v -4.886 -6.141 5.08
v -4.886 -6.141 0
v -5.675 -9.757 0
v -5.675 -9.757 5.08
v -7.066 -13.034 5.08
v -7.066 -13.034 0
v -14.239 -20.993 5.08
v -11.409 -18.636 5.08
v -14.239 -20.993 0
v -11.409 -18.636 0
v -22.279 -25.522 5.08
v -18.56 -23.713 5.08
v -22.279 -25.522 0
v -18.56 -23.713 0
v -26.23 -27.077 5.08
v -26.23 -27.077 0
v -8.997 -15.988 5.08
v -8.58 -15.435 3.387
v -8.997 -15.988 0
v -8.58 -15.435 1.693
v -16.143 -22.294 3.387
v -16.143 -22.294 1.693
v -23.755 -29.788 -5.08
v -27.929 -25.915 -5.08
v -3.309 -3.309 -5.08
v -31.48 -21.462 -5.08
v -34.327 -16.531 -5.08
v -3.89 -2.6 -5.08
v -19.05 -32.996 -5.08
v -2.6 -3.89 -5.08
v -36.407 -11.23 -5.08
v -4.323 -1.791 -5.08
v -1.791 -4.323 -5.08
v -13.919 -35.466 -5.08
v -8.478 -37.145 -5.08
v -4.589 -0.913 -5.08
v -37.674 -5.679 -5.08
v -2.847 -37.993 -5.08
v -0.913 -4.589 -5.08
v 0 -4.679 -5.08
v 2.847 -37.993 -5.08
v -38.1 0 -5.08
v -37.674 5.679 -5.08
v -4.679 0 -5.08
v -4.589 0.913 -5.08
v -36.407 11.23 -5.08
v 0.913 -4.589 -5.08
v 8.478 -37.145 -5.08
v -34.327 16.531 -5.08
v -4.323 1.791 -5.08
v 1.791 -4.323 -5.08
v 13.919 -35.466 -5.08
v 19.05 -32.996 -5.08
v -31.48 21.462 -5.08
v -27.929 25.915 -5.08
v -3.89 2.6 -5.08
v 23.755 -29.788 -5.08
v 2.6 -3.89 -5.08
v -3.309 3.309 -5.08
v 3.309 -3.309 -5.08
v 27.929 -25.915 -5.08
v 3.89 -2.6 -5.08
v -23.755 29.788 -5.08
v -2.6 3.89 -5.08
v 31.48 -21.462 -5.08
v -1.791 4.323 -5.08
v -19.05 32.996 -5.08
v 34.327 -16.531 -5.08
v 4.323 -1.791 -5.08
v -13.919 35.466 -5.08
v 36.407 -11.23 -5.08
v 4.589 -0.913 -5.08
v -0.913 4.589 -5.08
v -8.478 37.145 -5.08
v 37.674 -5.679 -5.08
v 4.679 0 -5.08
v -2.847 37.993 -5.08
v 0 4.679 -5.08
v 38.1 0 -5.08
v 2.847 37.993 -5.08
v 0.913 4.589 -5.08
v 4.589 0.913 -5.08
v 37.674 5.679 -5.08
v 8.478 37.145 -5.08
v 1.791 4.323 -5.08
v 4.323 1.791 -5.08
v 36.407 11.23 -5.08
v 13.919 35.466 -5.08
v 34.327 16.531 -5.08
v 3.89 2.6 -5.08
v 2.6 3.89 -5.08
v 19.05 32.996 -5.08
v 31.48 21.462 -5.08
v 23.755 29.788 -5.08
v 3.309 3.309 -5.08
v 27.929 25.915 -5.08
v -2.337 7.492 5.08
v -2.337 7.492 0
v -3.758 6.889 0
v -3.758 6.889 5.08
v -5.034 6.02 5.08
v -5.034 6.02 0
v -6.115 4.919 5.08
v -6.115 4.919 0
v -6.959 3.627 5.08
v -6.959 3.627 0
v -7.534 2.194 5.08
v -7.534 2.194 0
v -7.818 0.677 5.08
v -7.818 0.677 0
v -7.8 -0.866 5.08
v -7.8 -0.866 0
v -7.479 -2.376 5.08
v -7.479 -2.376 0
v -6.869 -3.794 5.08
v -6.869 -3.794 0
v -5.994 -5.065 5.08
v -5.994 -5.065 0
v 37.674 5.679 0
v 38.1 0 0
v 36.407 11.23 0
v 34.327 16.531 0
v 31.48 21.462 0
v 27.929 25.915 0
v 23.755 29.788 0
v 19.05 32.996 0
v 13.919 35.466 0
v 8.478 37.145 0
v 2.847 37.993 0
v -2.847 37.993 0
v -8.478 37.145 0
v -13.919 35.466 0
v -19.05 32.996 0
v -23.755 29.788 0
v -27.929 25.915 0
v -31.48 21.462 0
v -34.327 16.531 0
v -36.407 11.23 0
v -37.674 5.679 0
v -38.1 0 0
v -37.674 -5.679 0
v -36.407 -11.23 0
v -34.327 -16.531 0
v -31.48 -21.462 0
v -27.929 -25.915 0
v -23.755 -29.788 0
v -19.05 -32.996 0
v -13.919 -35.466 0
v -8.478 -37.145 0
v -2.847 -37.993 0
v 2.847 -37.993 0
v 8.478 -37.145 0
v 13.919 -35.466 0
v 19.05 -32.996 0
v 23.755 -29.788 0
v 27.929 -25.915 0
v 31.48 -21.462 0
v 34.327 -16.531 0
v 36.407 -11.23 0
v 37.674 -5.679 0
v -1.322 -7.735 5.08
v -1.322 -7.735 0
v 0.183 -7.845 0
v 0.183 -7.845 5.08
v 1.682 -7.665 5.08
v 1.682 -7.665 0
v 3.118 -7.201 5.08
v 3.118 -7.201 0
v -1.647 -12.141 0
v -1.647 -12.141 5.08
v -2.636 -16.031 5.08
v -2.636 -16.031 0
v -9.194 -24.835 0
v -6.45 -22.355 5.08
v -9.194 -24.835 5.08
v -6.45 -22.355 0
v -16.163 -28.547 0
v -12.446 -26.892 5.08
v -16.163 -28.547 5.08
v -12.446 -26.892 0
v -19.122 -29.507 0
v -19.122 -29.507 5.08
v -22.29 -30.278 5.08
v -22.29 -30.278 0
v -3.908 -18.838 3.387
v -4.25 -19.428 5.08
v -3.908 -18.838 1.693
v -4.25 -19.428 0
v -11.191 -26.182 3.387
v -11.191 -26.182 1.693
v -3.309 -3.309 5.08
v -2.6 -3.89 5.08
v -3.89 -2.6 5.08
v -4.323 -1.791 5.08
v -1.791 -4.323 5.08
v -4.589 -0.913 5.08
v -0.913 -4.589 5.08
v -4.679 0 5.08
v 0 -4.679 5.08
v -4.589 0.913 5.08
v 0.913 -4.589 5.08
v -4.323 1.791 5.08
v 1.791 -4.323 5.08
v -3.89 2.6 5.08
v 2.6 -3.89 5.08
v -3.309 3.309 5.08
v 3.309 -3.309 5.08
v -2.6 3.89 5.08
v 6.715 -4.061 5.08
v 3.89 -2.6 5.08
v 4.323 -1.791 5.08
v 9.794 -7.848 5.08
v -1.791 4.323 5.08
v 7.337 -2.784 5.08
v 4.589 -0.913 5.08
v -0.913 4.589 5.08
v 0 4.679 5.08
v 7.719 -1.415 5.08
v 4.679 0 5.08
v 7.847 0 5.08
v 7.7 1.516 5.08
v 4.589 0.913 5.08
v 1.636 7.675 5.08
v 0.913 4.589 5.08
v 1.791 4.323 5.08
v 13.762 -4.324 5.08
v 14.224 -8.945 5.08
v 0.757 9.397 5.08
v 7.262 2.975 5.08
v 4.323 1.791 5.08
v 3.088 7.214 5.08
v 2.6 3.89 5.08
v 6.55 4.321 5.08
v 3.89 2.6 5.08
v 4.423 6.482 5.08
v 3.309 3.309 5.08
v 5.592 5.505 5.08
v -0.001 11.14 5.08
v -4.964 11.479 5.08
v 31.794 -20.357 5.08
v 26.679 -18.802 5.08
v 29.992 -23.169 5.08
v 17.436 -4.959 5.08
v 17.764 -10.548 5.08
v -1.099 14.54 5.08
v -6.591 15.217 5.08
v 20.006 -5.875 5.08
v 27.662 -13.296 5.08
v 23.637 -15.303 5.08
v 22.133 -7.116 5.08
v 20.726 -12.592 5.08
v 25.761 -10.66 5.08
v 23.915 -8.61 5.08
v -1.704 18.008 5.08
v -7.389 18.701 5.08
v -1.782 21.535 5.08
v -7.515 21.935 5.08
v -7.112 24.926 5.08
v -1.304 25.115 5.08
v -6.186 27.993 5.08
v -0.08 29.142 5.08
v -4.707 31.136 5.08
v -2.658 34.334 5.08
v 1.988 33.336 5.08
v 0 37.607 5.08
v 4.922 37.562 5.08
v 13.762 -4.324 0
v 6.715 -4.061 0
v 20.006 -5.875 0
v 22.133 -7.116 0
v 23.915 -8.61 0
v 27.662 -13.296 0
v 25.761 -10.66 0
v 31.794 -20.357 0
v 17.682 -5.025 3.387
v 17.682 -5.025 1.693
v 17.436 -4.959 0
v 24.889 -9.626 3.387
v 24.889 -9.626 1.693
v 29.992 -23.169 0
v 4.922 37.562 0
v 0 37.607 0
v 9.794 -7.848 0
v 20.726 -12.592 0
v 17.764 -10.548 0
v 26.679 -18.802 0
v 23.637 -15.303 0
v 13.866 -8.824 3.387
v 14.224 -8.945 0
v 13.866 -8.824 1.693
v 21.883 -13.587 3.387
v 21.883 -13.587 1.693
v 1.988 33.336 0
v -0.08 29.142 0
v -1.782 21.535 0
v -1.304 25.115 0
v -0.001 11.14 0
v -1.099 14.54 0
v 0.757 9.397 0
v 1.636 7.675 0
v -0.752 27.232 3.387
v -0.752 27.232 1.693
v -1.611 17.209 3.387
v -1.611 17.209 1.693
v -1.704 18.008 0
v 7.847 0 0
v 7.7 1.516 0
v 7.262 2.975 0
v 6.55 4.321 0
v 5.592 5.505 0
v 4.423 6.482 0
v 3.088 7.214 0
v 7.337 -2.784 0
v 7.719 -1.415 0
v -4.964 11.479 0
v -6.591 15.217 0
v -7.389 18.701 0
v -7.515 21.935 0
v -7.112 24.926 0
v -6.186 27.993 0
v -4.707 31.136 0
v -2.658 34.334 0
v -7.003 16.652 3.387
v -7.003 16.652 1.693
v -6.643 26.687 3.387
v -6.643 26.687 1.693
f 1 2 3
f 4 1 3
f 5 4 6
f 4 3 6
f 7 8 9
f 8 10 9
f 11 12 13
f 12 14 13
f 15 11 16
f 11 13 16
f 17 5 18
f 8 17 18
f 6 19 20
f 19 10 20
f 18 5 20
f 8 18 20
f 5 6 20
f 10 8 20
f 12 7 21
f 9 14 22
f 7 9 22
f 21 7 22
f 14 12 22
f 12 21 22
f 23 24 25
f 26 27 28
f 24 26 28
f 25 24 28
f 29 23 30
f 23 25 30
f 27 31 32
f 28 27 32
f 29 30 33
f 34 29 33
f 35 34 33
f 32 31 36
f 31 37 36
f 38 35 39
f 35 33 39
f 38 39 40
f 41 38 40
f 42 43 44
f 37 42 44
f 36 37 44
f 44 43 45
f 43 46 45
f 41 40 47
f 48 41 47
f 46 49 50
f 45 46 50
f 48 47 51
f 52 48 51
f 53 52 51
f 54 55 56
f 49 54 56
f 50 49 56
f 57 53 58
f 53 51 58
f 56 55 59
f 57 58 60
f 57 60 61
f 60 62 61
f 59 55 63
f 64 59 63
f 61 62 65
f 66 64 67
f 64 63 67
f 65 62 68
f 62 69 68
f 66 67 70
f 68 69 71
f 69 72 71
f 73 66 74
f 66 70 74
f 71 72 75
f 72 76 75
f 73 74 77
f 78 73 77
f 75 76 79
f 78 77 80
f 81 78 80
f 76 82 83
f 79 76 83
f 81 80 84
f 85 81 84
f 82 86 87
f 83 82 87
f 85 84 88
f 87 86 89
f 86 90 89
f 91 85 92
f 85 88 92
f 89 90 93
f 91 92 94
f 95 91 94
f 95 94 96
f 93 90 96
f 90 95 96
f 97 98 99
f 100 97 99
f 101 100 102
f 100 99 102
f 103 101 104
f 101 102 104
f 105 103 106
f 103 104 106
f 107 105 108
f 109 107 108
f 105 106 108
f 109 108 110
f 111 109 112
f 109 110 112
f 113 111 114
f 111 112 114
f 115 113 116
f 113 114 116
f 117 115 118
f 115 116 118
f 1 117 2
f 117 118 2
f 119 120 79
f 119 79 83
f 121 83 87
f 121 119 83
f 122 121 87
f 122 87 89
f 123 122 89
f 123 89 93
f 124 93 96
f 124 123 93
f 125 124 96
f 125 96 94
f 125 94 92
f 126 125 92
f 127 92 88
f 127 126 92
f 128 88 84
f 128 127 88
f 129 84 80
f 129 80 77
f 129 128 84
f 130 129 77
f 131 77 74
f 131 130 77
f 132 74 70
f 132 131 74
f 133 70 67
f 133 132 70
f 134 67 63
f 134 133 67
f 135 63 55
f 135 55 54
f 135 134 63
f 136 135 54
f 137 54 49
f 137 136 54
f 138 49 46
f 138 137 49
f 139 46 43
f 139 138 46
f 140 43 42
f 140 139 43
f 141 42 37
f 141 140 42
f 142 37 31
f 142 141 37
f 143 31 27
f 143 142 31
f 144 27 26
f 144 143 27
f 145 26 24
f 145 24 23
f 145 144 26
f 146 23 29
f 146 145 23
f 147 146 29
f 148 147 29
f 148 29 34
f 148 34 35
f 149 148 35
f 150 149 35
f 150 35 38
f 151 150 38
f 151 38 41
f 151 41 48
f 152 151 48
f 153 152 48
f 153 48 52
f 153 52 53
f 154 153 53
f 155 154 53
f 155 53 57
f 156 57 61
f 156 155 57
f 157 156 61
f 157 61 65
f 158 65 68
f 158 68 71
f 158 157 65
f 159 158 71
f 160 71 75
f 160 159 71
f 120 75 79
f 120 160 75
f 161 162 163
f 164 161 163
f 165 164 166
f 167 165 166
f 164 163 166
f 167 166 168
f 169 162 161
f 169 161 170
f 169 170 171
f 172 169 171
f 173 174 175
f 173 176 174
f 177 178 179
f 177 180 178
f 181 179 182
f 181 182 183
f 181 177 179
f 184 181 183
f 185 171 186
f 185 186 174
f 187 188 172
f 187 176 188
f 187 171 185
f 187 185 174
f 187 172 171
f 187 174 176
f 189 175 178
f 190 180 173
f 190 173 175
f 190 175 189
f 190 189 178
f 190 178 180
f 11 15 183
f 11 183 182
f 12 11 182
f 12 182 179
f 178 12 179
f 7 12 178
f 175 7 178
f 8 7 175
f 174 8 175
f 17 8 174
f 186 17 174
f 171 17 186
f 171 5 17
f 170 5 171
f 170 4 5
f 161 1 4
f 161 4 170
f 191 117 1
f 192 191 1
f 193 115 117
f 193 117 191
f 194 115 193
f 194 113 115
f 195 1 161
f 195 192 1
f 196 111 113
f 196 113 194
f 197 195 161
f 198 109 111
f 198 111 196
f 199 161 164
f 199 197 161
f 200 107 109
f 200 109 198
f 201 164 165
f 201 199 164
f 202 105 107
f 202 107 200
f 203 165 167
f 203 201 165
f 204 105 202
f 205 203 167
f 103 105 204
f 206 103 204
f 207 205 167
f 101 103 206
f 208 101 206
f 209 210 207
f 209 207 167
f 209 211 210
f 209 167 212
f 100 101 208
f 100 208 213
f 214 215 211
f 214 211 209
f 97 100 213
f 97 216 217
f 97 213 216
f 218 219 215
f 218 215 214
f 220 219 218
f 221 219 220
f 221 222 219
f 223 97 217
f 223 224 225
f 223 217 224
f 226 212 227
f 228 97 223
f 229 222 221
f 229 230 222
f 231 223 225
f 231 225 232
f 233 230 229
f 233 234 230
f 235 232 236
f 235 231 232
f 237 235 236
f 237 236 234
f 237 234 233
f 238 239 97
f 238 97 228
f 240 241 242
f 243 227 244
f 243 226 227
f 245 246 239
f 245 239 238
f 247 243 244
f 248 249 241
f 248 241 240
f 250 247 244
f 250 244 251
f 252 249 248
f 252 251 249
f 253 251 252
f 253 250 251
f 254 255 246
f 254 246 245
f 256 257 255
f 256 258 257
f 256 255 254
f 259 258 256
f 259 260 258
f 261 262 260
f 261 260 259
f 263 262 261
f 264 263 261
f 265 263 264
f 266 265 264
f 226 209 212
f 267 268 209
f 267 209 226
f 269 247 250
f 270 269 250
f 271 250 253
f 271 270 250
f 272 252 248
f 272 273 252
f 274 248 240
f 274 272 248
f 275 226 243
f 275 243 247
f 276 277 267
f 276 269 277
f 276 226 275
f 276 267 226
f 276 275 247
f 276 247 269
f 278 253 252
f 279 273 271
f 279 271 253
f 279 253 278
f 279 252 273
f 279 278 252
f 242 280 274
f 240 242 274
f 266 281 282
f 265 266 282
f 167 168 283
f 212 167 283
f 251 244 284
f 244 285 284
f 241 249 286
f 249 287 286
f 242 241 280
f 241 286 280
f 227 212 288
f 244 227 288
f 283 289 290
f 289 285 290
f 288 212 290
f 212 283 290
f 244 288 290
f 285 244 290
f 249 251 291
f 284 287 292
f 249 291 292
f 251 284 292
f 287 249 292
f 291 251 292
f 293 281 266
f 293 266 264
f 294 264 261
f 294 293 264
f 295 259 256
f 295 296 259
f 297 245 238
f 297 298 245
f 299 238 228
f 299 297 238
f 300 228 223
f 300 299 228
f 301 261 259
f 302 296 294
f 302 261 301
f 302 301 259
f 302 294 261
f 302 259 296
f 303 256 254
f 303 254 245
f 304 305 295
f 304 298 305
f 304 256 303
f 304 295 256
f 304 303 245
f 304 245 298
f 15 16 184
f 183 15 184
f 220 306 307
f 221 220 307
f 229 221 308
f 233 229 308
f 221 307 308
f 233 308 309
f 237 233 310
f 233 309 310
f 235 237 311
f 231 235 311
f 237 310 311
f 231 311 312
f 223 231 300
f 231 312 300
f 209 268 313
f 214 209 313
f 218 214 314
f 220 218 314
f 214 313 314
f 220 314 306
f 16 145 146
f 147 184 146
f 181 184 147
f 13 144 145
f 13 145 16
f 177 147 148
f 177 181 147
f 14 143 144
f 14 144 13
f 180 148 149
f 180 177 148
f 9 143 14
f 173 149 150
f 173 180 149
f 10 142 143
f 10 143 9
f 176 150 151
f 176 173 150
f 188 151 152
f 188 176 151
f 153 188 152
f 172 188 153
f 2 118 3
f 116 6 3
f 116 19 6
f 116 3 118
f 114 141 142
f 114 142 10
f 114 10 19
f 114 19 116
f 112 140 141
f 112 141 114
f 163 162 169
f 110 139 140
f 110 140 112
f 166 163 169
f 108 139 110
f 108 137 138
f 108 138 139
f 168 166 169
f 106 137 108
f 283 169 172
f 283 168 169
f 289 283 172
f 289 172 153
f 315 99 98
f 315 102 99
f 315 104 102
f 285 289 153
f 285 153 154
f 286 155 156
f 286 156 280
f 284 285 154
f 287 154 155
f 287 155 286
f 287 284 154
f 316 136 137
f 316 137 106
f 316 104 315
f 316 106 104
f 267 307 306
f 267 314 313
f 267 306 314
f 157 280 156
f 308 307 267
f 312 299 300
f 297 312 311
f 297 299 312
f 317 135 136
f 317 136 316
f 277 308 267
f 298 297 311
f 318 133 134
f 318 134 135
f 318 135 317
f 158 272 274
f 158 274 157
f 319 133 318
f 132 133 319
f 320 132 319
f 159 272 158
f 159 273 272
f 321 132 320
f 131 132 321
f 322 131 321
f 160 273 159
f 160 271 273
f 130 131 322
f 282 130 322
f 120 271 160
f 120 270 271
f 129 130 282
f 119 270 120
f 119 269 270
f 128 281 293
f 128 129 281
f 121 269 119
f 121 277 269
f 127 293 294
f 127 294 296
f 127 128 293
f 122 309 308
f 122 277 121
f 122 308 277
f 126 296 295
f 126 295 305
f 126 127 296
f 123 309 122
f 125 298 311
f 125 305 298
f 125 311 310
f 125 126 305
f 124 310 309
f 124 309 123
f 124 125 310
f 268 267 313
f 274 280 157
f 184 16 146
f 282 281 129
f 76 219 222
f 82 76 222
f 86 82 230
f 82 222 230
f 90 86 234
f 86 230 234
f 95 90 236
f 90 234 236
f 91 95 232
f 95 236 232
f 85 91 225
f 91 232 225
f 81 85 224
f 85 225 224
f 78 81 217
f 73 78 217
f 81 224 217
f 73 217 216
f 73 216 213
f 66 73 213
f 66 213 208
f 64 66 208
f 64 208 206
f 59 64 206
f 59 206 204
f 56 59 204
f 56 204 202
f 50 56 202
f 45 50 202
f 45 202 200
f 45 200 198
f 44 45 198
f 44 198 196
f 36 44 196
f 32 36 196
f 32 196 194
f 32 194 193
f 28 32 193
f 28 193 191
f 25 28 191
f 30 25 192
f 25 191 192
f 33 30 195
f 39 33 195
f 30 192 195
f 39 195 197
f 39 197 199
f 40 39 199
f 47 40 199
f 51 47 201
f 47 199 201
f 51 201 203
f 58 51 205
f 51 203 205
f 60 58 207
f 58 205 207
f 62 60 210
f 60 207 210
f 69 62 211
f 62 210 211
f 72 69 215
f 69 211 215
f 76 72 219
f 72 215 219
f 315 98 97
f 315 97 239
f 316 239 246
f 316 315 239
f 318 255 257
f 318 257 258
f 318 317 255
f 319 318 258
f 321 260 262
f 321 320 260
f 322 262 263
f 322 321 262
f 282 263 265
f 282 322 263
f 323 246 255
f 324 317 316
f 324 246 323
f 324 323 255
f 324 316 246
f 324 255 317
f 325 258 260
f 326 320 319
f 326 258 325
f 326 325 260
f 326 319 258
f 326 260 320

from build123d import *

# Parameters (mm, degrees)
F0_R     = 38.1
F1_DEPTH = 5.08
F3_DEPTH = 5.08
F4_R     = 4.679015
F5_DEPTH = 25.4


with BuildPart() as f1:
    # F0 (on Top) → F1 (new body)
    with BuildSketch(Plane.XY):
        Circle(F0_R)
    extrude(amount=-F1_DEPTH)

    # F2 (on Top) → F3 (join)
    with BuildSketch(Plane.XY):
        with BuildLine():
            ThreePointArc((6.714925, -4.061114), (7.559037, -2.108039), (7.847475, 0))
            ThreePointArc((7.847475, 0), (6.10013, 4.936729), (1.636232, 7.674999))
            ThreePointArc((1.636232, 7.674999), (-0.362003, 7.839121), (-2.336609, 7.491537))
            ThreePointArc((-2.336609, 7.491537), (-7.713703, 1.442794), (-4.88639, -6.140526))
            ThreePointArc((-4.88639, -6.140526), (-3.20497, -7.163173), (-1.321987, -7.735323))
            ThreePointArc((-1.321987, -7.735323), (0.937058, -7.791328), (3.118403, -7.20128))
            ThreePointArc((3.118403, -7.20128), (5.161274, -5.911356), (6.714925, -4.061114))
        make_face()
        with BuildLine():
            ThreePointArc((-2.336609, 7.491537), (-0.362003, 7.839121), (1.636232, 7.674999))
            add(Edge.make_bspline(
                [(4.922261, 37.561897), (-3.396095, 27.139671), (-3.426963, 16.903229), (1.636232, 7.674999)],
                knots=[0, 0, 0, 0, 30.067003, 30.067003, 30.067003, 30.067003], degree=3))
            Line((4.922261, 37.561897), (0, 37.607454))
            add(Edge.make_bspline(
                [(-2.336609, 7.491537), (-9.098259, 16.218371), (-10.203362, 26.240014), (0, 37.607454)],
                knots=[0, 0, 0, 0, 30.206426, 30.206426, 30.206426, 30.206426], degree=3))
        make_face()
        with BuildLine():
            add(Edge.make_bspline(
                [(6.714925, -4.061114), (20.714046, -4.037036), (23.886483, -5.73107), (31.794433, -20.356581)],
                knots=[0, 0, 0, 0, 29.908592, 29.908592, 29.908592, 29.908592], degree=3))
            ThreePointArc((6.714925, -4.061114), (5.161274, -5.911356), (3.118403, -7.20128))
            add(Edge.make_bspline(
                [(3.118403, -7.20128), (16.17207, -7.814267), (20.896574, -10.618221), (29.992331, -23.169141)],
                knots=[0, 0, 0, 0, 31.259888, 31.259888, 31.259888, 31.259888], degree=3))
            Line((29.992331, -23.169141), (31.794433, -20.356581))
        make_face()
        with BuildLine():
            ThreePointArc((-1.321987, -7.735323), (-3.20497, -7.163173), (-4.88639, -6.140526))
            add(Edge.make_bspline(
                [(-4.88639, -6.140526), (-6.197293, -16.774258), (-15.328656, -23.210278), (-26.230019, -27.077071)],
                knots=[0, 0, 0, 0, 29.897983, 29.897983, 29.897983, 29.897983], degree=3))
            Line((-26.230019, -27.077071), (-22.290342, -30.278141))
            add(Edge.make_bspline(
                [(-1.321987, -7.735323), (-1.265044, -20.887848), (-9.577676, -27.635643), (-22.290342, -30.278141)],
                knots=[0, 0, 0, 0, 30.787181, 30.787181, 30.787181, 30.787181], degree=3))
        make_face()
    extrude(amount=F3_DEPTH)

    # F4 (on face) → F5 (cut)
    with BuildSketch(Plane.XY.offset(5.08)):
        Circle(F4_R)
    extrude(amount=-F5_DEPTH, mode=Mode.SUBTRACT)


solid = f1.part
